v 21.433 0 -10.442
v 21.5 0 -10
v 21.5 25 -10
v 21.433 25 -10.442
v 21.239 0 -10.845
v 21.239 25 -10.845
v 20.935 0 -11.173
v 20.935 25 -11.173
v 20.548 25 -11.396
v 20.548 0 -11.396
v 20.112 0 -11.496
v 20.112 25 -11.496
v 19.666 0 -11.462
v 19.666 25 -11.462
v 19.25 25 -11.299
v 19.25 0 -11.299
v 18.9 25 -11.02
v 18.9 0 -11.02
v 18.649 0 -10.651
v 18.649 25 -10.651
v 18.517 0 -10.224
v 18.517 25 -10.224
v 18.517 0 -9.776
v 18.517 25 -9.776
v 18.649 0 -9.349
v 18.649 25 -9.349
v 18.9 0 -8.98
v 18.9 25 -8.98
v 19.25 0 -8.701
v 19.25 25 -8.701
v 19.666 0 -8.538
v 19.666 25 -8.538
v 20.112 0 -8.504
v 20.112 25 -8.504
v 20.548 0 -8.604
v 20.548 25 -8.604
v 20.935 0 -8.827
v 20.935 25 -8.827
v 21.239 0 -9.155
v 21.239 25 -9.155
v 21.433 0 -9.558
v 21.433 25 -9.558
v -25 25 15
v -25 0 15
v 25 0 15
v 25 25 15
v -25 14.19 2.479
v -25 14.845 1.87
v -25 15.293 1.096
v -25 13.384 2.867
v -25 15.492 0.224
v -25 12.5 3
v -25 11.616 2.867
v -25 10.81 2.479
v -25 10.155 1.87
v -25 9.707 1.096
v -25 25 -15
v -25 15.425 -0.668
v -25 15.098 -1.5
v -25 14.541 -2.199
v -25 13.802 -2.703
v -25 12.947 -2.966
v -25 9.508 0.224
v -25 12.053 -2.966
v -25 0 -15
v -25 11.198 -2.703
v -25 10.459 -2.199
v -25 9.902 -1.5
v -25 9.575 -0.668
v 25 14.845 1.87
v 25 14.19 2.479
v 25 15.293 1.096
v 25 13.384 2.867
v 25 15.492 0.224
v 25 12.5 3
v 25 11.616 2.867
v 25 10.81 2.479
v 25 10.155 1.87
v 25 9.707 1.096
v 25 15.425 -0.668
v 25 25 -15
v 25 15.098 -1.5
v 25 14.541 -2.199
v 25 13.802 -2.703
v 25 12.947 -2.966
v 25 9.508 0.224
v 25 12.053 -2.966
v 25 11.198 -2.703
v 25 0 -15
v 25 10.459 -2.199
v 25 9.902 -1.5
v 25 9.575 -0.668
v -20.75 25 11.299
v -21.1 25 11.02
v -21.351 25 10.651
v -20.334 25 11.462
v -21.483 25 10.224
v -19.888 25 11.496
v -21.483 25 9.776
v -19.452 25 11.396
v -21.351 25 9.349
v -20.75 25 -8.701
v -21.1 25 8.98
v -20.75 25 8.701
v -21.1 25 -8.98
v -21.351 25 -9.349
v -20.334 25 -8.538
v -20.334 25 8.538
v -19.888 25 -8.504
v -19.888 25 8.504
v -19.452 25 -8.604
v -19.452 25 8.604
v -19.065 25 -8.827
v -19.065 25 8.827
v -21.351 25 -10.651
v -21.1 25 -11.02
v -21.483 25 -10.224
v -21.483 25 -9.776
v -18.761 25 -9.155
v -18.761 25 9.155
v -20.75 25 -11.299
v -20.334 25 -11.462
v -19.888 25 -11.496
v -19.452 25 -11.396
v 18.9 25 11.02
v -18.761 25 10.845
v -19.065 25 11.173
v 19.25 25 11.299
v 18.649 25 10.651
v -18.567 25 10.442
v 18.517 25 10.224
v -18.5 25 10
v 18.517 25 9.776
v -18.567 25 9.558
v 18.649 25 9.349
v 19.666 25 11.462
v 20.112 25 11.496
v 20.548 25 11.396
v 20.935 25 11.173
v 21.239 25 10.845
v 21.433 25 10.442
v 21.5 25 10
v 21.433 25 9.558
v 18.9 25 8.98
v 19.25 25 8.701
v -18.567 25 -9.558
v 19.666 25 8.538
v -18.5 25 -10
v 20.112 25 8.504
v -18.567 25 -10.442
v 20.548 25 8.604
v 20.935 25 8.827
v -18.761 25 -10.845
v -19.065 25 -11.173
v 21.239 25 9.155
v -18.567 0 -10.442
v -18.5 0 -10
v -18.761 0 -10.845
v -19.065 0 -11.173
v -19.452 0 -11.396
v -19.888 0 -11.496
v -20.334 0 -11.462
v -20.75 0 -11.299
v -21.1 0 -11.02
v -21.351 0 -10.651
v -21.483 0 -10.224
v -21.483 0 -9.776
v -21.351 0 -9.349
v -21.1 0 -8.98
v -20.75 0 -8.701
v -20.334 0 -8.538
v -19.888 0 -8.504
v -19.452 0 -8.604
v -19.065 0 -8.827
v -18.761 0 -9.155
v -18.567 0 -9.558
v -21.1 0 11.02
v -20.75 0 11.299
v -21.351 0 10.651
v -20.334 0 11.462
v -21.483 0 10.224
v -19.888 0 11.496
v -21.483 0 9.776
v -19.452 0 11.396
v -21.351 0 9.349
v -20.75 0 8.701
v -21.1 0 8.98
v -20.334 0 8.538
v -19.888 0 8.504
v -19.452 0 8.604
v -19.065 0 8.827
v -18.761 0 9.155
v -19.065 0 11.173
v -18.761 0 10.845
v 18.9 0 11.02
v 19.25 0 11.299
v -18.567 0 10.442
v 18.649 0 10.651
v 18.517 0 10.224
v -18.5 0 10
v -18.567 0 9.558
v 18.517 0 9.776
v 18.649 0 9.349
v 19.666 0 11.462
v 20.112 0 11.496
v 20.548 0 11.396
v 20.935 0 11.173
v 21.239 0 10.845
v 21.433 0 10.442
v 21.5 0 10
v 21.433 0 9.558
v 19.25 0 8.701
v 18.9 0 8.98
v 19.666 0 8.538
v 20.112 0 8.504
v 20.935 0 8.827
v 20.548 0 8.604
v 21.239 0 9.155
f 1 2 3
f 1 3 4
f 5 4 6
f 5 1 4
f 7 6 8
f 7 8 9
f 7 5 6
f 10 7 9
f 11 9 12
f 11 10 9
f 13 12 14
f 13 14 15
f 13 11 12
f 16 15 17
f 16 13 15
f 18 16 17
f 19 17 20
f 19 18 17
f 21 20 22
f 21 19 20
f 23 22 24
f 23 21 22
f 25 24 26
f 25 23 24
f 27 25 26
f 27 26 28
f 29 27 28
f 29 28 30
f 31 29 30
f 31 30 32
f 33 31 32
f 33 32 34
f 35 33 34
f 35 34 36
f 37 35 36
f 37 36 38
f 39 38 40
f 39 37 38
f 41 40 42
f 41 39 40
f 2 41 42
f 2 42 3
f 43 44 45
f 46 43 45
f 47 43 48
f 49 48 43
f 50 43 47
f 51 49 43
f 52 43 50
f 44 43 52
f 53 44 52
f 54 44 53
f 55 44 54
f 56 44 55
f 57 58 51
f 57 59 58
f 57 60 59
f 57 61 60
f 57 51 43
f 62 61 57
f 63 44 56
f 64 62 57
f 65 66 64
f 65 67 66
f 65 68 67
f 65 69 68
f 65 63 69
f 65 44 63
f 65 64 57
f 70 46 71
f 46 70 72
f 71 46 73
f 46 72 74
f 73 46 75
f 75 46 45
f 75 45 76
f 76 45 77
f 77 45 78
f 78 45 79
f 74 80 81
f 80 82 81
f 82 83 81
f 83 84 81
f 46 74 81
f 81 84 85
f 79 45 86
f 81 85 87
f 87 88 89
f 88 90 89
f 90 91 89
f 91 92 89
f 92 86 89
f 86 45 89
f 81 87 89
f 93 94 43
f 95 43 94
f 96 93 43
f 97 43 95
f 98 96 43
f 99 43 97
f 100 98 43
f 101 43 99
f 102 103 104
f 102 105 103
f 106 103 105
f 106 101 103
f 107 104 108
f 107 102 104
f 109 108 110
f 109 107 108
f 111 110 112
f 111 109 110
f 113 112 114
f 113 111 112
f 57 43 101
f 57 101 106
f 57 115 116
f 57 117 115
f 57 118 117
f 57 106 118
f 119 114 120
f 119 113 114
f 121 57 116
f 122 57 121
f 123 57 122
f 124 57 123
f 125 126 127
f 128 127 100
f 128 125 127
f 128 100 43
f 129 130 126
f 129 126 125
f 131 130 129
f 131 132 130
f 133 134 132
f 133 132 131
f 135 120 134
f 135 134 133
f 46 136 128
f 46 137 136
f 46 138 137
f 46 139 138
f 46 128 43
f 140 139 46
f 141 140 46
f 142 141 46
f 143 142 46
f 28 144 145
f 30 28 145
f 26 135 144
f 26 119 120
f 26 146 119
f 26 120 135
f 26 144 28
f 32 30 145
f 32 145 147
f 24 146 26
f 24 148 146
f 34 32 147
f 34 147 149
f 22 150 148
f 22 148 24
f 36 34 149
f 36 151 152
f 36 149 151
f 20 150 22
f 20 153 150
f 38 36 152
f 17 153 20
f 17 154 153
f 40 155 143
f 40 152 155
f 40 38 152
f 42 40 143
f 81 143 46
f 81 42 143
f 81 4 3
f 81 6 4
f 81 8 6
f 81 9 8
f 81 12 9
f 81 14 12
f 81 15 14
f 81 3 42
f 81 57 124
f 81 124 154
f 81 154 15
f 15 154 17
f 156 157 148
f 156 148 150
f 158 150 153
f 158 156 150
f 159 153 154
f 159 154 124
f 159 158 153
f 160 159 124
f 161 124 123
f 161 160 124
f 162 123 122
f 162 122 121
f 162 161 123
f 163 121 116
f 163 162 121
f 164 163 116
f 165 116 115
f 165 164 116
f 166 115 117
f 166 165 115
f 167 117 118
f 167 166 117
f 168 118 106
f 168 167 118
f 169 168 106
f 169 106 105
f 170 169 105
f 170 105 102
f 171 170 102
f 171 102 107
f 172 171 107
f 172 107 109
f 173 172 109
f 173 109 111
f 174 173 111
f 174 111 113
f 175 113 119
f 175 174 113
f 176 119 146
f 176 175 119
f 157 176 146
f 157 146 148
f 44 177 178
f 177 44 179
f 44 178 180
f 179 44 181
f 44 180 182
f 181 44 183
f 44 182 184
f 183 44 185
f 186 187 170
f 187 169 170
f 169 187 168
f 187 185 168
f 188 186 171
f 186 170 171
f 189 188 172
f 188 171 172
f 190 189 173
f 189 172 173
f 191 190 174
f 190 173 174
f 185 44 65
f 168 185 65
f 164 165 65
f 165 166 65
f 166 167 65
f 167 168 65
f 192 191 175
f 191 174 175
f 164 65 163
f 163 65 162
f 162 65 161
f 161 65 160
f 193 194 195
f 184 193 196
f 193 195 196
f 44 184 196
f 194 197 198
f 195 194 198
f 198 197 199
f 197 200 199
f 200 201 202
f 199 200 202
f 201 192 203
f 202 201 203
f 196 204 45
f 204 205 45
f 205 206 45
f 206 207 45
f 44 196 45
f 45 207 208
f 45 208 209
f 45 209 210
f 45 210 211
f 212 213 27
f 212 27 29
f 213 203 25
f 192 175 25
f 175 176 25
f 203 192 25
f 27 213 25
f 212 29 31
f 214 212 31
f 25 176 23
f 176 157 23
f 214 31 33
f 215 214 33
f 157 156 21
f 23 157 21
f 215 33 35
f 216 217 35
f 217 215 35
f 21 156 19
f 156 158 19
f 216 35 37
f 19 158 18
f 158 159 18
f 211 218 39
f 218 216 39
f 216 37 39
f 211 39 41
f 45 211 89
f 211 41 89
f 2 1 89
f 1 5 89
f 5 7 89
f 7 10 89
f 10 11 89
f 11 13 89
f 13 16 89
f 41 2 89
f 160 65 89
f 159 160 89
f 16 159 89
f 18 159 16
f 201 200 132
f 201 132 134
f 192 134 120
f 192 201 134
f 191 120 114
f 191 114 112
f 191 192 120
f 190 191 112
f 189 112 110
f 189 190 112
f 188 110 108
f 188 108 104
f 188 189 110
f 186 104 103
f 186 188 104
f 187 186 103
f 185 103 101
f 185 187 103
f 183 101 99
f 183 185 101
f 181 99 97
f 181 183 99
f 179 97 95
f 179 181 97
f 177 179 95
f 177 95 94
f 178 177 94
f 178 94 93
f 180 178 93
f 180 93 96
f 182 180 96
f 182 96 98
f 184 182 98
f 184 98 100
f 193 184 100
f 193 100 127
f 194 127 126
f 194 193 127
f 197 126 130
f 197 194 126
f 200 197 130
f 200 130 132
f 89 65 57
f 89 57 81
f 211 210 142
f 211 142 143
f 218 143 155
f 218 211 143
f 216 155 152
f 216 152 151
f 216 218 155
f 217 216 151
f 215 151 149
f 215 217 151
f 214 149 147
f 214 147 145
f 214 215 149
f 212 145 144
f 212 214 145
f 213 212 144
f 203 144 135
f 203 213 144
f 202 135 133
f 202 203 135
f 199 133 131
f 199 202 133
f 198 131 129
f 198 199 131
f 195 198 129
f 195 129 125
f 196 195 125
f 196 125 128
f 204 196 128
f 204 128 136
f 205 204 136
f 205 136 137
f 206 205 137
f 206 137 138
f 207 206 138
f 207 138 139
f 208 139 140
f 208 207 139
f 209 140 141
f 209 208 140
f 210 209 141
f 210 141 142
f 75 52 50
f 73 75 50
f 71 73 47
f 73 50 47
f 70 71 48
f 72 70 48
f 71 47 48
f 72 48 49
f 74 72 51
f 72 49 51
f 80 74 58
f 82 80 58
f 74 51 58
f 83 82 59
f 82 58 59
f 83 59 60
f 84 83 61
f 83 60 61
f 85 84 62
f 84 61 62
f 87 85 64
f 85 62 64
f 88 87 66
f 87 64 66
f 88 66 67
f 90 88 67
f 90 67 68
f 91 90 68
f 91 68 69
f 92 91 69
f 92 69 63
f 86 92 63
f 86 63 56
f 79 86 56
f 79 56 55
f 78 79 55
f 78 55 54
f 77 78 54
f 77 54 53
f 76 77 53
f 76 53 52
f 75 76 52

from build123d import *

# Parameters (mm, degrees)
ESQUISSE1_W             = 50
ESQUISSE1_H             = 30
ESQUISSE1_R             = 1.5
BOSS_EXTRU_1_DEPTH      = 25
ENL_V_MAT_EXTRU_1_REACH = 52
ESQUISSE2_R             = 3


with BuildPart() as part:
    # Esquisse1 → Boss.-Extru.1 (new body)
    with BuildSketch(Plane(origin=(0, 0, 0), x_dir=(1, 0, 0), z_dir=(0, 1, 0))):
        Rectangle(ESQUISSE1_W, ESQUISSE1_H)
        with Locations((-20, 10)):
            Circle(ESQUISSE1_R, mode=Mode.SUBTRACT)
        with Locations((-20, -10)):
            Circle(ESQUISSE1_R, mode=Mode.SUBTRACT)
        with Locations((20, -10)):
            Circle(ESQUISSE1_R, mode=Mode.SUBTRACT)
        with Locations((20, 10)):
            Circle(ESQUISSE1_R, mode=Mode.SUBTRACT)
    extrude(amount=BOSS_EXTRU_1_DEPTH)

    # Esquisse2 → Enlèv. mat.-Extru.1 (cut, up to next)
    with BuildSketch(Plane.ZY.offset(25), mode=Mode.PRIVATE) as enl_v_mat_extru_1_sk1:
        with Locations((0, 12.5)):
            Circle(ESQUISSE2_R)
    enl_v_mat_extru_1_tool1 = extrude(enl_v_mat_extru_1_sk1.sketch, amount=-ENL_V_MAT_EXTRU_1_REACH, mode=Mode.PRIVATE) & part.part
    add(enl_v_mat_extru_1_tool1.solids().sort_by_distance((-25, 12.5, 0))[0], mode=Mode.SUBTRACT)


solid = part.part
